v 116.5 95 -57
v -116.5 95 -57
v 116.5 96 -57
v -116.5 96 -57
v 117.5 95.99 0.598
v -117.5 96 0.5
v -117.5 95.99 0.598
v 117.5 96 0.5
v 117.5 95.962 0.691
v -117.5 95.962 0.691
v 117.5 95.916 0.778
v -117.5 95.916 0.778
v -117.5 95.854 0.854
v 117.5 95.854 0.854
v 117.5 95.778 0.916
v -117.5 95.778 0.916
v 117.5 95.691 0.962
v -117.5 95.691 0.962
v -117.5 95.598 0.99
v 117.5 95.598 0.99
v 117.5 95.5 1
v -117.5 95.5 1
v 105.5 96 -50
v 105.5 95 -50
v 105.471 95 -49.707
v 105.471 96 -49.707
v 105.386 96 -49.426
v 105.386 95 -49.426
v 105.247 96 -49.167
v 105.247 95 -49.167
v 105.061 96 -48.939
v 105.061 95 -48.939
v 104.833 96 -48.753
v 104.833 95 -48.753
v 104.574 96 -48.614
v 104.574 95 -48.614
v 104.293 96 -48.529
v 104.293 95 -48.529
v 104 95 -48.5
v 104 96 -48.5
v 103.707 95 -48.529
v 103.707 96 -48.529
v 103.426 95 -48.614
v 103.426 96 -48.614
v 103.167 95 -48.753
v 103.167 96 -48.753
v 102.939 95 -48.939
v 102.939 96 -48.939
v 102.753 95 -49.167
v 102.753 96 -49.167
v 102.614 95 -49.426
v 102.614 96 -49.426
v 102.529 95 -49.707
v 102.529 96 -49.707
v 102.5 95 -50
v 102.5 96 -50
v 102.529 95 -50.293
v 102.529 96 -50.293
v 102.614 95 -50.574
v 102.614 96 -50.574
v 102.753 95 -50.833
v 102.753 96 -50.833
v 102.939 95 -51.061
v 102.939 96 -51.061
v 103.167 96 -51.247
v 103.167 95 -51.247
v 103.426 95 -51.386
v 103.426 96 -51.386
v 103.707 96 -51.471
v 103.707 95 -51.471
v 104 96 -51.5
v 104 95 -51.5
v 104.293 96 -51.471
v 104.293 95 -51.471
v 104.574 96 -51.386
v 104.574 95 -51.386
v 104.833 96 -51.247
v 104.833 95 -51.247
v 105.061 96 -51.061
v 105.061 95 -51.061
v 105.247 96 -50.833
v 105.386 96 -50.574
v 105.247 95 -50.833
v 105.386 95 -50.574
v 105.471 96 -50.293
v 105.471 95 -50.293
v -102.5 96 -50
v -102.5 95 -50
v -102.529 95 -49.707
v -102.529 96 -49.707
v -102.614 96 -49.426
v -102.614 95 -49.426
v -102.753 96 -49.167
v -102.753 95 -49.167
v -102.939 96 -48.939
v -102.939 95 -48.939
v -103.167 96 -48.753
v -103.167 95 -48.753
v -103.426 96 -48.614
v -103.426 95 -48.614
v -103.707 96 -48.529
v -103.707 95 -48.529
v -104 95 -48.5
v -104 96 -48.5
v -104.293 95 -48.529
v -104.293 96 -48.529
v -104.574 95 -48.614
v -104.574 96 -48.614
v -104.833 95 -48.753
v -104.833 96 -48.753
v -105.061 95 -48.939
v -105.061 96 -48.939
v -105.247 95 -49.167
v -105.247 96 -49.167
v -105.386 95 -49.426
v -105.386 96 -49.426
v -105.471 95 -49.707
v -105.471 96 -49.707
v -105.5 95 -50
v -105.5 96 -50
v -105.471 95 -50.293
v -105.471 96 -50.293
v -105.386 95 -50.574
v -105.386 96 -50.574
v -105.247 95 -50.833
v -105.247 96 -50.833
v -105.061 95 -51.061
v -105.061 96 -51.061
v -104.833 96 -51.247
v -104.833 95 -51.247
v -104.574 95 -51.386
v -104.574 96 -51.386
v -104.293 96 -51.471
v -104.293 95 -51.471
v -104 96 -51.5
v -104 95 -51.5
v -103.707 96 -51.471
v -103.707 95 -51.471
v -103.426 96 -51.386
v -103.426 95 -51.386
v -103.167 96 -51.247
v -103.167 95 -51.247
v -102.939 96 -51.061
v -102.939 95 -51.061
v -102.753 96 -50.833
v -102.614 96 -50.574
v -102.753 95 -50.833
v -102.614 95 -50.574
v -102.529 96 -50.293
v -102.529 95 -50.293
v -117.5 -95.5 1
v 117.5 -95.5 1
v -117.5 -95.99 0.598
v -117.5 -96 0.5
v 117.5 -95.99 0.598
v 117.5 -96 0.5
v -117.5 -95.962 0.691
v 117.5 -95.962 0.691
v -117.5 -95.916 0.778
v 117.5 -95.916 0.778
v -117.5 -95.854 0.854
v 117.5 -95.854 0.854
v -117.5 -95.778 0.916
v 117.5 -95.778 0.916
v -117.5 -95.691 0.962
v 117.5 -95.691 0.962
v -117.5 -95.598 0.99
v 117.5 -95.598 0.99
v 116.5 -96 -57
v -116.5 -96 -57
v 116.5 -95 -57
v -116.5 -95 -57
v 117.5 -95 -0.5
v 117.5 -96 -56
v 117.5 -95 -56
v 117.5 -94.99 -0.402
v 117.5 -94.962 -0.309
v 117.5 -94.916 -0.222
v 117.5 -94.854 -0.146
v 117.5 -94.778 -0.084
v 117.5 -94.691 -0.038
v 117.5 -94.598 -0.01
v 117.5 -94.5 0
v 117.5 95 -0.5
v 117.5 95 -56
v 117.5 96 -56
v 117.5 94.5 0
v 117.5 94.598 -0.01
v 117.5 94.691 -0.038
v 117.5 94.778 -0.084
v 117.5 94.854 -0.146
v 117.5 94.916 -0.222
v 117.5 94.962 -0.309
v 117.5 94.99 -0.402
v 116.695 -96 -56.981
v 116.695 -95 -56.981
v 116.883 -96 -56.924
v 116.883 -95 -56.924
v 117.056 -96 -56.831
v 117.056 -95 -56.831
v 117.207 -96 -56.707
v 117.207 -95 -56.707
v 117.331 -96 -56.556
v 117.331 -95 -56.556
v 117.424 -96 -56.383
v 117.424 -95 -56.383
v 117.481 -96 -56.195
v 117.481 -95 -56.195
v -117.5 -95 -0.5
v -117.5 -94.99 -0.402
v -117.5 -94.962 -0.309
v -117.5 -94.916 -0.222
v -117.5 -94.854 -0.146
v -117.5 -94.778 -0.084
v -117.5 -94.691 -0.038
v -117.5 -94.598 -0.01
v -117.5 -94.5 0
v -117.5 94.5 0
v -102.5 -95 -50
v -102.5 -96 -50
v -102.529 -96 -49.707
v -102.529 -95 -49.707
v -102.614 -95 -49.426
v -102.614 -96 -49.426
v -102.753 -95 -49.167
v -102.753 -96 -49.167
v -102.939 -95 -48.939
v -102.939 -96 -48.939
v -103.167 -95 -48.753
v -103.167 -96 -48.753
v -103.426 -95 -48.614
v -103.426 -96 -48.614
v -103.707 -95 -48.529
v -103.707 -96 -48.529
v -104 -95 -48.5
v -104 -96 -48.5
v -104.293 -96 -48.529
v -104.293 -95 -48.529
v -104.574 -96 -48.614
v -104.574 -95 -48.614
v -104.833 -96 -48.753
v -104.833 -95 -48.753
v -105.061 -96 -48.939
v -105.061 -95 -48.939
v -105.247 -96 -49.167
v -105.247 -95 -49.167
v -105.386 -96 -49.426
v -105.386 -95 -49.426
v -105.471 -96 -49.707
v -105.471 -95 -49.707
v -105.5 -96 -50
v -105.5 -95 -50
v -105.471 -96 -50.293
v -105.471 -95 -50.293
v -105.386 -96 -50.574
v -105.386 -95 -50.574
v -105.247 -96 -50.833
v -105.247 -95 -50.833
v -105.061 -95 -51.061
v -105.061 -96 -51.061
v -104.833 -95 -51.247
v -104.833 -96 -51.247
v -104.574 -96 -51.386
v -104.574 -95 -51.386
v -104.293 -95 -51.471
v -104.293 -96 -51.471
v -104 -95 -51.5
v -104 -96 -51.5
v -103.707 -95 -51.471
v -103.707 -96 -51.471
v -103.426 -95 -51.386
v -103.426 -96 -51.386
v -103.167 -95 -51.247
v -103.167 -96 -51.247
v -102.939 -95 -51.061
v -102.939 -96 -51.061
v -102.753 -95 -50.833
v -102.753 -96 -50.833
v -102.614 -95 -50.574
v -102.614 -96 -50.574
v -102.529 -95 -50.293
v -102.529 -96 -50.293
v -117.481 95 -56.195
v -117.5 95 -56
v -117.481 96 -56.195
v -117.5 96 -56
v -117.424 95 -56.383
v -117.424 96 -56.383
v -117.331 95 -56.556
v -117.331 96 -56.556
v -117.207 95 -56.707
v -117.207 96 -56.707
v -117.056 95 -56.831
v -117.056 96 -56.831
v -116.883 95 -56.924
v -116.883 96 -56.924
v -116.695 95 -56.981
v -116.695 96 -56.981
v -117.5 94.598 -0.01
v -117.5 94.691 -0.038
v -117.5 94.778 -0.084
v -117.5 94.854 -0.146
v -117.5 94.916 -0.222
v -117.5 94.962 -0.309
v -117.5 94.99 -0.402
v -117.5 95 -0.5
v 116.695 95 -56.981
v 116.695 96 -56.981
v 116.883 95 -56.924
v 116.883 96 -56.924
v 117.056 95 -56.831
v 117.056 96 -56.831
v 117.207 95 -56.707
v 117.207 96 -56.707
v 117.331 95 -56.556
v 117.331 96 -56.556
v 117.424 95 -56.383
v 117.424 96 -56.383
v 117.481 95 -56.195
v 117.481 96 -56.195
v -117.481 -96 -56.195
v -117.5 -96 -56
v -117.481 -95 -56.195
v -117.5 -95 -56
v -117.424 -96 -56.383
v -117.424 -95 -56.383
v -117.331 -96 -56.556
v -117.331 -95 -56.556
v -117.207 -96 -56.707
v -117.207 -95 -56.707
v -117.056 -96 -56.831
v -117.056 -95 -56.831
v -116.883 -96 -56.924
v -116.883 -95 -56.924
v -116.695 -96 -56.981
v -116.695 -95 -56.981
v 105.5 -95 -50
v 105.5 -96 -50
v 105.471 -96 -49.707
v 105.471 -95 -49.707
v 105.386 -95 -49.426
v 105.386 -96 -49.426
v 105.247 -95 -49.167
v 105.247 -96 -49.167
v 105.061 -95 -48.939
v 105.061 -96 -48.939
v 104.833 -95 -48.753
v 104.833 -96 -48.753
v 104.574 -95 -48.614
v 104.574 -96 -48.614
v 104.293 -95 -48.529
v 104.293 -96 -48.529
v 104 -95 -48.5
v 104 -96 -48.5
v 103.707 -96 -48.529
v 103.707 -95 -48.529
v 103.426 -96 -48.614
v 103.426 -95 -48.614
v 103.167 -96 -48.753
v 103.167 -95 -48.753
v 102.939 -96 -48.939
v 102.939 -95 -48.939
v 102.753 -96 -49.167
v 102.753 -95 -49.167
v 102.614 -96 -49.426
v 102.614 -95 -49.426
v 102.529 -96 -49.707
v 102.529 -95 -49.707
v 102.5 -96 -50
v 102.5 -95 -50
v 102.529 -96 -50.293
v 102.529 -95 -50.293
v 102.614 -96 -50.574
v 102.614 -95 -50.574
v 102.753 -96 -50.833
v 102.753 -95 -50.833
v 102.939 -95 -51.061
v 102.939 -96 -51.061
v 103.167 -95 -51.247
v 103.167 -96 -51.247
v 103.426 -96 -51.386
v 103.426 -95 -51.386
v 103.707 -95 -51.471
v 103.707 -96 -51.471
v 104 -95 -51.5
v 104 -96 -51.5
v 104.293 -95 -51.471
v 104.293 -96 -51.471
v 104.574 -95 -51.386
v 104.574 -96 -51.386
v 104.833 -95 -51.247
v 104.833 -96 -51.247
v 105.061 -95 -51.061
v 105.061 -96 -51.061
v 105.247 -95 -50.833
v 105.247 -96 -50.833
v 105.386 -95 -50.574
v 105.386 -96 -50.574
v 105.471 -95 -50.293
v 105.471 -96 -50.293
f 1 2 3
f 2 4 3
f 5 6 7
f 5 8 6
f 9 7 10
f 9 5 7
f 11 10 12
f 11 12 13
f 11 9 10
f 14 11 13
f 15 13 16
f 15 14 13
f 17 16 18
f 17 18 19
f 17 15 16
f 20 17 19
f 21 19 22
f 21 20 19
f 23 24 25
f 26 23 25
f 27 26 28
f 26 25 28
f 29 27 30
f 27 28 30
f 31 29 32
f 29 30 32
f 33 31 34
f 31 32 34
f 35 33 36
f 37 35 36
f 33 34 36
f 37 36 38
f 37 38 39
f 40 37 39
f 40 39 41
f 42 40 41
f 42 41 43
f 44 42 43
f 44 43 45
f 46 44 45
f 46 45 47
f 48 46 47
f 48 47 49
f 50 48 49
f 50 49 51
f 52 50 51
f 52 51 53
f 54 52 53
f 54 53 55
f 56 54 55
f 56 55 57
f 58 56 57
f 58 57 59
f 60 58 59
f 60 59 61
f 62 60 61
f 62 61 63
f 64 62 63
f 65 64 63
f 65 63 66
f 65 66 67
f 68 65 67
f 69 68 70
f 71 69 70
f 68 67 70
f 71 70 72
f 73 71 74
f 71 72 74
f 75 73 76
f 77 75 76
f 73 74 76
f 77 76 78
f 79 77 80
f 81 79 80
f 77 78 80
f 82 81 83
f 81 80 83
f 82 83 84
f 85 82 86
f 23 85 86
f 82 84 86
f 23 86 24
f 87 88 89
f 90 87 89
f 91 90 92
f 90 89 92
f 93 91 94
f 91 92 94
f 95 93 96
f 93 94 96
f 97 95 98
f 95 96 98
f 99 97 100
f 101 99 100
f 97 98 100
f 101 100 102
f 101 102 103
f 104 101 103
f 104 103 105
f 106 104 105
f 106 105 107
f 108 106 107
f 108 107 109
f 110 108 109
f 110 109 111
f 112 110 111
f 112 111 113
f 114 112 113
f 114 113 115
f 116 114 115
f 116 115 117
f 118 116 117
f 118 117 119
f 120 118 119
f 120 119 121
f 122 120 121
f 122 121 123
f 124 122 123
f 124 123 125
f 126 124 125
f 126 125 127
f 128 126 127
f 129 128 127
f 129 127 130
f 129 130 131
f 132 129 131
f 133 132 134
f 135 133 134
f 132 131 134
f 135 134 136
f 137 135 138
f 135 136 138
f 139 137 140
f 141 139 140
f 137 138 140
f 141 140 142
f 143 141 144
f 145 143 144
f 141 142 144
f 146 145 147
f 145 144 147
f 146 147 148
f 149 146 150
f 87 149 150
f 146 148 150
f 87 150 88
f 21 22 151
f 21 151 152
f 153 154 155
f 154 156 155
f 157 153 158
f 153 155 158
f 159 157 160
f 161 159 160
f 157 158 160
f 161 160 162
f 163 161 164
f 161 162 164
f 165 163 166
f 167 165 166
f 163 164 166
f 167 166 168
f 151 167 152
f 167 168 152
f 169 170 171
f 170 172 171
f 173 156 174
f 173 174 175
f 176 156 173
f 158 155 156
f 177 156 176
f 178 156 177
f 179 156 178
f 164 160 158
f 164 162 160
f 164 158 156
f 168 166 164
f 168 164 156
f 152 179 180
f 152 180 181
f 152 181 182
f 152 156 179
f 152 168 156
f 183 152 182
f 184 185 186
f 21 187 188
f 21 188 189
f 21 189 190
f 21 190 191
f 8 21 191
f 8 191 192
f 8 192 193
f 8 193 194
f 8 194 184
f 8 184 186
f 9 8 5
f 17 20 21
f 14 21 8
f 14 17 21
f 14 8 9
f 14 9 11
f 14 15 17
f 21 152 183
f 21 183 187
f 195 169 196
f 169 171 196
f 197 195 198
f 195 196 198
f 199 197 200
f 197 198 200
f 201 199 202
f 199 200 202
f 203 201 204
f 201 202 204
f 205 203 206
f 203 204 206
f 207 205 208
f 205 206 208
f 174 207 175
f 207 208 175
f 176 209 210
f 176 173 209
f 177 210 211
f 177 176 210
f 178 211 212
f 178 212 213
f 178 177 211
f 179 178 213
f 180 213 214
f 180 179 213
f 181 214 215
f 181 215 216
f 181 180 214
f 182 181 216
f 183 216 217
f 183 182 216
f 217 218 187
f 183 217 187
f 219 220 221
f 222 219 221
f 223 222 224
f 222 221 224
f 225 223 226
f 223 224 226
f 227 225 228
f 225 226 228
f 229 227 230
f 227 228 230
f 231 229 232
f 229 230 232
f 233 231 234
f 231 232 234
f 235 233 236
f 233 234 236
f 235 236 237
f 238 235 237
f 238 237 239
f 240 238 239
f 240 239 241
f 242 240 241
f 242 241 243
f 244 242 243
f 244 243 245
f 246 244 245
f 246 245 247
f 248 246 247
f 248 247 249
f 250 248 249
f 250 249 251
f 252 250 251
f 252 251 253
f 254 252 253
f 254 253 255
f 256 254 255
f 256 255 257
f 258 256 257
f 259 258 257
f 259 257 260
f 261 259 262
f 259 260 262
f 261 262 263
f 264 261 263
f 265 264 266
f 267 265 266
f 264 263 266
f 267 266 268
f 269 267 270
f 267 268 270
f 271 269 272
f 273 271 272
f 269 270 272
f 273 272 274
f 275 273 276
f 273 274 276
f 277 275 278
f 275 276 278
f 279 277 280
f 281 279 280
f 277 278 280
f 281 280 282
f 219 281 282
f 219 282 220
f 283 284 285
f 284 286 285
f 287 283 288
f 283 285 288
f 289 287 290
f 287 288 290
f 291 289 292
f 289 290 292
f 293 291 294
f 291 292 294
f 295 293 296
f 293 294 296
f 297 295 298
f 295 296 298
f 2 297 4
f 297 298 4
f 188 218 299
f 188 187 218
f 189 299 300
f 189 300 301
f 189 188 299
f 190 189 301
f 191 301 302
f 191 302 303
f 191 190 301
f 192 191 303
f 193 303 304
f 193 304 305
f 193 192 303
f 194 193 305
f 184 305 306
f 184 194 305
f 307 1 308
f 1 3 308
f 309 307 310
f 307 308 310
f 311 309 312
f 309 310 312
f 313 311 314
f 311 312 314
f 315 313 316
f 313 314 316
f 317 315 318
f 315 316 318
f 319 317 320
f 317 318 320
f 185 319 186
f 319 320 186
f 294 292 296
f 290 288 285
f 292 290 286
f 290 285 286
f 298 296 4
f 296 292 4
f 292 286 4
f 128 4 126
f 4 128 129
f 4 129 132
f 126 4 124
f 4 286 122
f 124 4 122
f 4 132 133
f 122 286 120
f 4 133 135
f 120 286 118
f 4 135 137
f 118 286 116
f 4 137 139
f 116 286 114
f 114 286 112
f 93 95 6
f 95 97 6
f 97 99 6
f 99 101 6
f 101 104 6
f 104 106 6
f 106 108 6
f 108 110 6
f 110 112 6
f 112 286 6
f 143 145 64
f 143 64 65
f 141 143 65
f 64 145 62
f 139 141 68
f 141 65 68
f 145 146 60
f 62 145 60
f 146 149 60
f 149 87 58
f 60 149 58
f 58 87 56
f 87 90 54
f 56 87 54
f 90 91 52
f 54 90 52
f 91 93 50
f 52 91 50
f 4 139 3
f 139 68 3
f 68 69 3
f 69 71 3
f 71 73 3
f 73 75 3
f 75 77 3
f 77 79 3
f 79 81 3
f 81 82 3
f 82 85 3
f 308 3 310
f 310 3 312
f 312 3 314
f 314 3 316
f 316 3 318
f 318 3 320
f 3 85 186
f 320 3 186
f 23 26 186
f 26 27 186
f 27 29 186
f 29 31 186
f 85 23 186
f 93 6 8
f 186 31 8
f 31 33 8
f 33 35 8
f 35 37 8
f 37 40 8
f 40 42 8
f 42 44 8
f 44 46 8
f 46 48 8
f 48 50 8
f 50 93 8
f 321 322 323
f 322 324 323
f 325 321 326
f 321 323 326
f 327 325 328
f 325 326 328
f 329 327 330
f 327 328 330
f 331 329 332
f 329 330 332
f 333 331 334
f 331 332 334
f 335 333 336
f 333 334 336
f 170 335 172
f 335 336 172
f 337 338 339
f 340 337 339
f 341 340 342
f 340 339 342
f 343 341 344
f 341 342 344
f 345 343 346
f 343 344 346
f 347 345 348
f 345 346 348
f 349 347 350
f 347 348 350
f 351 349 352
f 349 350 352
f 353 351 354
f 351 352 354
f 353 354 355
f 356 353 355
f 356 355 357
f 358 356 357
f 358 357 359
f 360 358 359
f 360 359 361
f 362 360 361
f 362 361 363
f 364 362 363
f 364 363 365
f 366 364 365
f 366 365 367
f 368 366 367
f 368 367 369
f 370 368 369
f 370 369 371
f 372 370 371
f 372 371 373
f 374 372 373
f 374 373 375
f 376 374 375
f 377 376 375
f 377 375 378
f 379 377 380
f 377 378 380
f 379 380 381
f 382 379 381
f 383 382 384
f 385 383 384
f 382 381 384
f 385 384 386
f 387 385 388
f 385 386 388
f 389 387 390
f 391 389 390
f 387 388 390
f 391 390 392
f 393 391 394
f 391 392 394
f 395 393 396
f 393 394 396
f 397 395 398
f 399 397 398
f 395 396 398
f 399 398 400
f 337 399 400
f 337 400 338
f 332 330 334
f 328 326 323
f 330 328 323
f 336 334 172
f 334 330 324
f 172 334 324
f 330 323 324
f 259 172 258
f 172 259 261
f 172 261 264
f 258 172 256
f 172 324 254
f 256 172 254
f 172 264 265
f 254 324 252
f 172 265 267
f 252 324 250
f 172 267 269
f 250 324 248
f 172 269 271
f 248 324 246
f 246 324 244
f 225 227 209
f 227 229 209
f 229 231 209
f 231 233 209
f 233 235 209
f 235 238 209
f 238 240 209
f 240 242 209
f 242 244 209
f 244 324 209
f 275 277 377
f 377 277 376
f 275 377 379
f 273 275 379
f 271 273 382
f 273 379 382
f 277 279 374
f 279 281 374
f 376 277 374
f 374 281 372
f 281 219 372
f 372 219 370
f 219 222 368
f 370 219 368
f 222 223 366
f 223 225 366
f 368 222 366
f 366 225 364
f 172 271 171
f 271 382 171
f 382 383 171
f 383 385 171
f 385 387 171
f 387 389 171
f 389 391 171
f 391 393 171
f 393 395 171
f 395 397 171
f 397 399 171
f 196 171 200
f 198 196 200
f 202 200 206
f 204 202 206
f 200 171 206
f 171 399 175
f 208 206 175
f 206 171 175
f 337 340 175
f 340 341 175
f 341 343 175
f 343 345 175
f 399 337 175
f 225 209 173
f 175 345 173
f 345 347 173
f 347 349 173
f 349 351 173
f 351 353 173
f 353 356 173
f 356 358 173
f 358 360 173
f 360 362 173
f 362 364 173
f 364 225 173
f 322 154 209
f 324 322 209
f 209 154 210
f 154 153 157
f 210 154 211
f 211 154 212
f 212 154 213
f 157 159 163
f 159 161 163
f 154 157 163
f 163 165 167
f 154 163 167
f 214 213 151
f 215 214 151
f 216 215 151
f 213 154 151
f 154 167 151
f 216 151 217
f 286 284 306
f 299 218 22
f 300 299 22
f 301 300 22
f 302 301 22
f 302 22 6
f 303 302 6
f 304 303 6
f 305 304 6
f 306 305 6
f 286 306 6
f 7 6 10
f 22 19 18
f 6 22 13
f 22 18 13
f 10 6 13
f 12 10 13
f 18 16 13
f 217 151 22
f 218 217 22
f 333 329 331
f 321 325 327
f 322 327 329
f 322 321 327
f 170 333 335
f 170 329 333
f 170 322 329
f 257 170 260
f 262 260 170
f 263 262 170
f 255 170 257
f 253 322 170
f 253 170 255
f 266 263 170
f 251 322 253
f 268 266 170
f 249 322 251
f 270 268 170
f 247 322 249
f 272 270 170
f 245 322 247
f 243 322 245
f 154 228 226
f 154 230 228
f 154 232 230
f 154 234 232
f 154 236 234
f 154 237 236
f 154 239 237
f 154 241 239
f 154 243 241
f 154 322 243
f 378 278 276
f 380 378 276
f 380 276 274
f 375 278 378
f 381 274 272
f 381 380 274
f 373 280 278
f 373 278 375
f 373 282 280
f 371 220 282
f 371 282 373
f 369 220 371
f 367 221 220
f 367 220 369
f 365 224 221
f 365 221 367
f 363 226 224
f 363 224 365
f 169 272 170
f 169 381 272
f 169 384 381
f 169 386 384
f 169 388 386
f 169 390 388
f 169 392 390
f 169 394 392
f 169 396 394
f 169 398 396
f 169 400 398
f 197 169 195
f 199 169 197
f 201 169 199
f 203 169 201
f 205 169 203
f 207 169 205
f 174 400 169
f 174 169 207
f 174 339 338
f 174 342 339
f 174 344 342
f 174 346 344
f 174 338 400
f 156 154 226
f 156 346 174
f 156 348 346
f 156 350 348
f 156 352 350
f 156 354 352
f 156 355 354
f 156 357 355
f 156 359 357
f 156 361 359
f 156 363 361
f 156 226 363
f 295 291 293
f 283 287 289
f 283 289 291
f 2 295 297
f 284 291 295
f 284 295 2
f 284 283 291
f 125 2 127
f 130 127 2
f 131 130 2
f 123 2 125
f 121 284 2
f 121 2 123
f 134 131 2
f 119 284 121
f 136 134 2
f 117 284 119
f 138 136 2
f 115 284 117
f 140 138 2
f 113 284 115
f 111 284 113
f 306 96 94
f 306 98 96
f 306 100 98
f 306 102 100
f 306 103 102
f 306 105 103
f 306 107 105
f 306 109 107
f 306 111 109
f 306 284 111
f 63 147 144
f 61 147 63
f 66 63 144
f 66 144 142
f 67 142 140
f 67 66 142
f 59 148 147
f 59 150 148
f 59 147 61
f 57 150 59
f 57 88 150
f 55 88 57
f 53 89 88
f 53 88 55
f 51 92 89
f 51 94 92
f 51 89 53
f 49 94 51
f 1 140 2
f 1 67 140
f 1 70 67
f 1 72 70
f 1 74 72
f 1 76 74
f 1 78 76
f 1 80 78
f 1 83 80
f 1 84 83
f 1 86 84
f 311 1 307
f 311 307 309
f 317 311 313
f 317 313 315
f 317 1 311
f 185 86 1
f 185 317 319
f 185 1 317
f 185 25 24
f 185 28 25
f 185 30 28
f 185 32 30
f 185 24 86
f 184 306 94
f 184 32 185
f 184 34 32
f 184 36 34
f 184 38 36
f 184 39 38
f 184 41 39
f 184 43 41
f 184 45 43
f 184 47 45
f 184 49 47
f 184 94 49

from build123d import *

# Parameters (mm, degrees)
F0_W     = 235
F0_H     = 190
F1_DEPTH = 1
F2_W     = 235
F2_H     = 1
F3_DEPTH = 58
F4_R     = 1.5
F5_DEPTH = 192.001
F6_R     = 0.5
F7_R     = 1


with BuildPart() as f1:
    # F0 (on Top) → F1 (new body)
    with BuildSketch(Plane.XY):
        Rectangle(F0_W, F0_H)
    extrude(amount=F1_DEPTH)

    # F2 (on face) → F3 (join)
    with BuildSketch(Plane.XY.offset(1)):
        with Locations((0, -95.5)):
            Rectangle(F2_W, F2_H)
        with Locations((0, 95.5)):
            Rectangle(F2_W, F2_H)
    extrude(amount=-F3_DEPTH)

    # F4 (on face) → F5 (cut, through all)
    with BuildSketch(Plane.XZ.offset(96)):
        with Locations((-104, -50)):
            Circle(F4_R)
        with Locations((104, -50)):
            Circle(F4_R)
    extrude(amount=-F5_DEPTH, mode=Mode.SUBTRACT)

    # F6
    f6_edges = [f1.edges().sort_by_distance(p)[0] for p in [
        (0, -96, 1),
        (0, 96, 1),
        (0, -95, 0),
        (0, 95, 0),
    ]]
    fillet(f6_edges, radius=F6_R)

    # F7
    f7_edges = [f1.edges().sort_by_distance(p)[0] for p in [
        (-117.5, -95.5, -57),
        (117.5, -95.5, -57),
        (117.5, 95.5, -57),
        (-117.5, 95.5, -57),
    ]]
    fillet(f7_edges, radius=F7_R)


solid = f1.part
